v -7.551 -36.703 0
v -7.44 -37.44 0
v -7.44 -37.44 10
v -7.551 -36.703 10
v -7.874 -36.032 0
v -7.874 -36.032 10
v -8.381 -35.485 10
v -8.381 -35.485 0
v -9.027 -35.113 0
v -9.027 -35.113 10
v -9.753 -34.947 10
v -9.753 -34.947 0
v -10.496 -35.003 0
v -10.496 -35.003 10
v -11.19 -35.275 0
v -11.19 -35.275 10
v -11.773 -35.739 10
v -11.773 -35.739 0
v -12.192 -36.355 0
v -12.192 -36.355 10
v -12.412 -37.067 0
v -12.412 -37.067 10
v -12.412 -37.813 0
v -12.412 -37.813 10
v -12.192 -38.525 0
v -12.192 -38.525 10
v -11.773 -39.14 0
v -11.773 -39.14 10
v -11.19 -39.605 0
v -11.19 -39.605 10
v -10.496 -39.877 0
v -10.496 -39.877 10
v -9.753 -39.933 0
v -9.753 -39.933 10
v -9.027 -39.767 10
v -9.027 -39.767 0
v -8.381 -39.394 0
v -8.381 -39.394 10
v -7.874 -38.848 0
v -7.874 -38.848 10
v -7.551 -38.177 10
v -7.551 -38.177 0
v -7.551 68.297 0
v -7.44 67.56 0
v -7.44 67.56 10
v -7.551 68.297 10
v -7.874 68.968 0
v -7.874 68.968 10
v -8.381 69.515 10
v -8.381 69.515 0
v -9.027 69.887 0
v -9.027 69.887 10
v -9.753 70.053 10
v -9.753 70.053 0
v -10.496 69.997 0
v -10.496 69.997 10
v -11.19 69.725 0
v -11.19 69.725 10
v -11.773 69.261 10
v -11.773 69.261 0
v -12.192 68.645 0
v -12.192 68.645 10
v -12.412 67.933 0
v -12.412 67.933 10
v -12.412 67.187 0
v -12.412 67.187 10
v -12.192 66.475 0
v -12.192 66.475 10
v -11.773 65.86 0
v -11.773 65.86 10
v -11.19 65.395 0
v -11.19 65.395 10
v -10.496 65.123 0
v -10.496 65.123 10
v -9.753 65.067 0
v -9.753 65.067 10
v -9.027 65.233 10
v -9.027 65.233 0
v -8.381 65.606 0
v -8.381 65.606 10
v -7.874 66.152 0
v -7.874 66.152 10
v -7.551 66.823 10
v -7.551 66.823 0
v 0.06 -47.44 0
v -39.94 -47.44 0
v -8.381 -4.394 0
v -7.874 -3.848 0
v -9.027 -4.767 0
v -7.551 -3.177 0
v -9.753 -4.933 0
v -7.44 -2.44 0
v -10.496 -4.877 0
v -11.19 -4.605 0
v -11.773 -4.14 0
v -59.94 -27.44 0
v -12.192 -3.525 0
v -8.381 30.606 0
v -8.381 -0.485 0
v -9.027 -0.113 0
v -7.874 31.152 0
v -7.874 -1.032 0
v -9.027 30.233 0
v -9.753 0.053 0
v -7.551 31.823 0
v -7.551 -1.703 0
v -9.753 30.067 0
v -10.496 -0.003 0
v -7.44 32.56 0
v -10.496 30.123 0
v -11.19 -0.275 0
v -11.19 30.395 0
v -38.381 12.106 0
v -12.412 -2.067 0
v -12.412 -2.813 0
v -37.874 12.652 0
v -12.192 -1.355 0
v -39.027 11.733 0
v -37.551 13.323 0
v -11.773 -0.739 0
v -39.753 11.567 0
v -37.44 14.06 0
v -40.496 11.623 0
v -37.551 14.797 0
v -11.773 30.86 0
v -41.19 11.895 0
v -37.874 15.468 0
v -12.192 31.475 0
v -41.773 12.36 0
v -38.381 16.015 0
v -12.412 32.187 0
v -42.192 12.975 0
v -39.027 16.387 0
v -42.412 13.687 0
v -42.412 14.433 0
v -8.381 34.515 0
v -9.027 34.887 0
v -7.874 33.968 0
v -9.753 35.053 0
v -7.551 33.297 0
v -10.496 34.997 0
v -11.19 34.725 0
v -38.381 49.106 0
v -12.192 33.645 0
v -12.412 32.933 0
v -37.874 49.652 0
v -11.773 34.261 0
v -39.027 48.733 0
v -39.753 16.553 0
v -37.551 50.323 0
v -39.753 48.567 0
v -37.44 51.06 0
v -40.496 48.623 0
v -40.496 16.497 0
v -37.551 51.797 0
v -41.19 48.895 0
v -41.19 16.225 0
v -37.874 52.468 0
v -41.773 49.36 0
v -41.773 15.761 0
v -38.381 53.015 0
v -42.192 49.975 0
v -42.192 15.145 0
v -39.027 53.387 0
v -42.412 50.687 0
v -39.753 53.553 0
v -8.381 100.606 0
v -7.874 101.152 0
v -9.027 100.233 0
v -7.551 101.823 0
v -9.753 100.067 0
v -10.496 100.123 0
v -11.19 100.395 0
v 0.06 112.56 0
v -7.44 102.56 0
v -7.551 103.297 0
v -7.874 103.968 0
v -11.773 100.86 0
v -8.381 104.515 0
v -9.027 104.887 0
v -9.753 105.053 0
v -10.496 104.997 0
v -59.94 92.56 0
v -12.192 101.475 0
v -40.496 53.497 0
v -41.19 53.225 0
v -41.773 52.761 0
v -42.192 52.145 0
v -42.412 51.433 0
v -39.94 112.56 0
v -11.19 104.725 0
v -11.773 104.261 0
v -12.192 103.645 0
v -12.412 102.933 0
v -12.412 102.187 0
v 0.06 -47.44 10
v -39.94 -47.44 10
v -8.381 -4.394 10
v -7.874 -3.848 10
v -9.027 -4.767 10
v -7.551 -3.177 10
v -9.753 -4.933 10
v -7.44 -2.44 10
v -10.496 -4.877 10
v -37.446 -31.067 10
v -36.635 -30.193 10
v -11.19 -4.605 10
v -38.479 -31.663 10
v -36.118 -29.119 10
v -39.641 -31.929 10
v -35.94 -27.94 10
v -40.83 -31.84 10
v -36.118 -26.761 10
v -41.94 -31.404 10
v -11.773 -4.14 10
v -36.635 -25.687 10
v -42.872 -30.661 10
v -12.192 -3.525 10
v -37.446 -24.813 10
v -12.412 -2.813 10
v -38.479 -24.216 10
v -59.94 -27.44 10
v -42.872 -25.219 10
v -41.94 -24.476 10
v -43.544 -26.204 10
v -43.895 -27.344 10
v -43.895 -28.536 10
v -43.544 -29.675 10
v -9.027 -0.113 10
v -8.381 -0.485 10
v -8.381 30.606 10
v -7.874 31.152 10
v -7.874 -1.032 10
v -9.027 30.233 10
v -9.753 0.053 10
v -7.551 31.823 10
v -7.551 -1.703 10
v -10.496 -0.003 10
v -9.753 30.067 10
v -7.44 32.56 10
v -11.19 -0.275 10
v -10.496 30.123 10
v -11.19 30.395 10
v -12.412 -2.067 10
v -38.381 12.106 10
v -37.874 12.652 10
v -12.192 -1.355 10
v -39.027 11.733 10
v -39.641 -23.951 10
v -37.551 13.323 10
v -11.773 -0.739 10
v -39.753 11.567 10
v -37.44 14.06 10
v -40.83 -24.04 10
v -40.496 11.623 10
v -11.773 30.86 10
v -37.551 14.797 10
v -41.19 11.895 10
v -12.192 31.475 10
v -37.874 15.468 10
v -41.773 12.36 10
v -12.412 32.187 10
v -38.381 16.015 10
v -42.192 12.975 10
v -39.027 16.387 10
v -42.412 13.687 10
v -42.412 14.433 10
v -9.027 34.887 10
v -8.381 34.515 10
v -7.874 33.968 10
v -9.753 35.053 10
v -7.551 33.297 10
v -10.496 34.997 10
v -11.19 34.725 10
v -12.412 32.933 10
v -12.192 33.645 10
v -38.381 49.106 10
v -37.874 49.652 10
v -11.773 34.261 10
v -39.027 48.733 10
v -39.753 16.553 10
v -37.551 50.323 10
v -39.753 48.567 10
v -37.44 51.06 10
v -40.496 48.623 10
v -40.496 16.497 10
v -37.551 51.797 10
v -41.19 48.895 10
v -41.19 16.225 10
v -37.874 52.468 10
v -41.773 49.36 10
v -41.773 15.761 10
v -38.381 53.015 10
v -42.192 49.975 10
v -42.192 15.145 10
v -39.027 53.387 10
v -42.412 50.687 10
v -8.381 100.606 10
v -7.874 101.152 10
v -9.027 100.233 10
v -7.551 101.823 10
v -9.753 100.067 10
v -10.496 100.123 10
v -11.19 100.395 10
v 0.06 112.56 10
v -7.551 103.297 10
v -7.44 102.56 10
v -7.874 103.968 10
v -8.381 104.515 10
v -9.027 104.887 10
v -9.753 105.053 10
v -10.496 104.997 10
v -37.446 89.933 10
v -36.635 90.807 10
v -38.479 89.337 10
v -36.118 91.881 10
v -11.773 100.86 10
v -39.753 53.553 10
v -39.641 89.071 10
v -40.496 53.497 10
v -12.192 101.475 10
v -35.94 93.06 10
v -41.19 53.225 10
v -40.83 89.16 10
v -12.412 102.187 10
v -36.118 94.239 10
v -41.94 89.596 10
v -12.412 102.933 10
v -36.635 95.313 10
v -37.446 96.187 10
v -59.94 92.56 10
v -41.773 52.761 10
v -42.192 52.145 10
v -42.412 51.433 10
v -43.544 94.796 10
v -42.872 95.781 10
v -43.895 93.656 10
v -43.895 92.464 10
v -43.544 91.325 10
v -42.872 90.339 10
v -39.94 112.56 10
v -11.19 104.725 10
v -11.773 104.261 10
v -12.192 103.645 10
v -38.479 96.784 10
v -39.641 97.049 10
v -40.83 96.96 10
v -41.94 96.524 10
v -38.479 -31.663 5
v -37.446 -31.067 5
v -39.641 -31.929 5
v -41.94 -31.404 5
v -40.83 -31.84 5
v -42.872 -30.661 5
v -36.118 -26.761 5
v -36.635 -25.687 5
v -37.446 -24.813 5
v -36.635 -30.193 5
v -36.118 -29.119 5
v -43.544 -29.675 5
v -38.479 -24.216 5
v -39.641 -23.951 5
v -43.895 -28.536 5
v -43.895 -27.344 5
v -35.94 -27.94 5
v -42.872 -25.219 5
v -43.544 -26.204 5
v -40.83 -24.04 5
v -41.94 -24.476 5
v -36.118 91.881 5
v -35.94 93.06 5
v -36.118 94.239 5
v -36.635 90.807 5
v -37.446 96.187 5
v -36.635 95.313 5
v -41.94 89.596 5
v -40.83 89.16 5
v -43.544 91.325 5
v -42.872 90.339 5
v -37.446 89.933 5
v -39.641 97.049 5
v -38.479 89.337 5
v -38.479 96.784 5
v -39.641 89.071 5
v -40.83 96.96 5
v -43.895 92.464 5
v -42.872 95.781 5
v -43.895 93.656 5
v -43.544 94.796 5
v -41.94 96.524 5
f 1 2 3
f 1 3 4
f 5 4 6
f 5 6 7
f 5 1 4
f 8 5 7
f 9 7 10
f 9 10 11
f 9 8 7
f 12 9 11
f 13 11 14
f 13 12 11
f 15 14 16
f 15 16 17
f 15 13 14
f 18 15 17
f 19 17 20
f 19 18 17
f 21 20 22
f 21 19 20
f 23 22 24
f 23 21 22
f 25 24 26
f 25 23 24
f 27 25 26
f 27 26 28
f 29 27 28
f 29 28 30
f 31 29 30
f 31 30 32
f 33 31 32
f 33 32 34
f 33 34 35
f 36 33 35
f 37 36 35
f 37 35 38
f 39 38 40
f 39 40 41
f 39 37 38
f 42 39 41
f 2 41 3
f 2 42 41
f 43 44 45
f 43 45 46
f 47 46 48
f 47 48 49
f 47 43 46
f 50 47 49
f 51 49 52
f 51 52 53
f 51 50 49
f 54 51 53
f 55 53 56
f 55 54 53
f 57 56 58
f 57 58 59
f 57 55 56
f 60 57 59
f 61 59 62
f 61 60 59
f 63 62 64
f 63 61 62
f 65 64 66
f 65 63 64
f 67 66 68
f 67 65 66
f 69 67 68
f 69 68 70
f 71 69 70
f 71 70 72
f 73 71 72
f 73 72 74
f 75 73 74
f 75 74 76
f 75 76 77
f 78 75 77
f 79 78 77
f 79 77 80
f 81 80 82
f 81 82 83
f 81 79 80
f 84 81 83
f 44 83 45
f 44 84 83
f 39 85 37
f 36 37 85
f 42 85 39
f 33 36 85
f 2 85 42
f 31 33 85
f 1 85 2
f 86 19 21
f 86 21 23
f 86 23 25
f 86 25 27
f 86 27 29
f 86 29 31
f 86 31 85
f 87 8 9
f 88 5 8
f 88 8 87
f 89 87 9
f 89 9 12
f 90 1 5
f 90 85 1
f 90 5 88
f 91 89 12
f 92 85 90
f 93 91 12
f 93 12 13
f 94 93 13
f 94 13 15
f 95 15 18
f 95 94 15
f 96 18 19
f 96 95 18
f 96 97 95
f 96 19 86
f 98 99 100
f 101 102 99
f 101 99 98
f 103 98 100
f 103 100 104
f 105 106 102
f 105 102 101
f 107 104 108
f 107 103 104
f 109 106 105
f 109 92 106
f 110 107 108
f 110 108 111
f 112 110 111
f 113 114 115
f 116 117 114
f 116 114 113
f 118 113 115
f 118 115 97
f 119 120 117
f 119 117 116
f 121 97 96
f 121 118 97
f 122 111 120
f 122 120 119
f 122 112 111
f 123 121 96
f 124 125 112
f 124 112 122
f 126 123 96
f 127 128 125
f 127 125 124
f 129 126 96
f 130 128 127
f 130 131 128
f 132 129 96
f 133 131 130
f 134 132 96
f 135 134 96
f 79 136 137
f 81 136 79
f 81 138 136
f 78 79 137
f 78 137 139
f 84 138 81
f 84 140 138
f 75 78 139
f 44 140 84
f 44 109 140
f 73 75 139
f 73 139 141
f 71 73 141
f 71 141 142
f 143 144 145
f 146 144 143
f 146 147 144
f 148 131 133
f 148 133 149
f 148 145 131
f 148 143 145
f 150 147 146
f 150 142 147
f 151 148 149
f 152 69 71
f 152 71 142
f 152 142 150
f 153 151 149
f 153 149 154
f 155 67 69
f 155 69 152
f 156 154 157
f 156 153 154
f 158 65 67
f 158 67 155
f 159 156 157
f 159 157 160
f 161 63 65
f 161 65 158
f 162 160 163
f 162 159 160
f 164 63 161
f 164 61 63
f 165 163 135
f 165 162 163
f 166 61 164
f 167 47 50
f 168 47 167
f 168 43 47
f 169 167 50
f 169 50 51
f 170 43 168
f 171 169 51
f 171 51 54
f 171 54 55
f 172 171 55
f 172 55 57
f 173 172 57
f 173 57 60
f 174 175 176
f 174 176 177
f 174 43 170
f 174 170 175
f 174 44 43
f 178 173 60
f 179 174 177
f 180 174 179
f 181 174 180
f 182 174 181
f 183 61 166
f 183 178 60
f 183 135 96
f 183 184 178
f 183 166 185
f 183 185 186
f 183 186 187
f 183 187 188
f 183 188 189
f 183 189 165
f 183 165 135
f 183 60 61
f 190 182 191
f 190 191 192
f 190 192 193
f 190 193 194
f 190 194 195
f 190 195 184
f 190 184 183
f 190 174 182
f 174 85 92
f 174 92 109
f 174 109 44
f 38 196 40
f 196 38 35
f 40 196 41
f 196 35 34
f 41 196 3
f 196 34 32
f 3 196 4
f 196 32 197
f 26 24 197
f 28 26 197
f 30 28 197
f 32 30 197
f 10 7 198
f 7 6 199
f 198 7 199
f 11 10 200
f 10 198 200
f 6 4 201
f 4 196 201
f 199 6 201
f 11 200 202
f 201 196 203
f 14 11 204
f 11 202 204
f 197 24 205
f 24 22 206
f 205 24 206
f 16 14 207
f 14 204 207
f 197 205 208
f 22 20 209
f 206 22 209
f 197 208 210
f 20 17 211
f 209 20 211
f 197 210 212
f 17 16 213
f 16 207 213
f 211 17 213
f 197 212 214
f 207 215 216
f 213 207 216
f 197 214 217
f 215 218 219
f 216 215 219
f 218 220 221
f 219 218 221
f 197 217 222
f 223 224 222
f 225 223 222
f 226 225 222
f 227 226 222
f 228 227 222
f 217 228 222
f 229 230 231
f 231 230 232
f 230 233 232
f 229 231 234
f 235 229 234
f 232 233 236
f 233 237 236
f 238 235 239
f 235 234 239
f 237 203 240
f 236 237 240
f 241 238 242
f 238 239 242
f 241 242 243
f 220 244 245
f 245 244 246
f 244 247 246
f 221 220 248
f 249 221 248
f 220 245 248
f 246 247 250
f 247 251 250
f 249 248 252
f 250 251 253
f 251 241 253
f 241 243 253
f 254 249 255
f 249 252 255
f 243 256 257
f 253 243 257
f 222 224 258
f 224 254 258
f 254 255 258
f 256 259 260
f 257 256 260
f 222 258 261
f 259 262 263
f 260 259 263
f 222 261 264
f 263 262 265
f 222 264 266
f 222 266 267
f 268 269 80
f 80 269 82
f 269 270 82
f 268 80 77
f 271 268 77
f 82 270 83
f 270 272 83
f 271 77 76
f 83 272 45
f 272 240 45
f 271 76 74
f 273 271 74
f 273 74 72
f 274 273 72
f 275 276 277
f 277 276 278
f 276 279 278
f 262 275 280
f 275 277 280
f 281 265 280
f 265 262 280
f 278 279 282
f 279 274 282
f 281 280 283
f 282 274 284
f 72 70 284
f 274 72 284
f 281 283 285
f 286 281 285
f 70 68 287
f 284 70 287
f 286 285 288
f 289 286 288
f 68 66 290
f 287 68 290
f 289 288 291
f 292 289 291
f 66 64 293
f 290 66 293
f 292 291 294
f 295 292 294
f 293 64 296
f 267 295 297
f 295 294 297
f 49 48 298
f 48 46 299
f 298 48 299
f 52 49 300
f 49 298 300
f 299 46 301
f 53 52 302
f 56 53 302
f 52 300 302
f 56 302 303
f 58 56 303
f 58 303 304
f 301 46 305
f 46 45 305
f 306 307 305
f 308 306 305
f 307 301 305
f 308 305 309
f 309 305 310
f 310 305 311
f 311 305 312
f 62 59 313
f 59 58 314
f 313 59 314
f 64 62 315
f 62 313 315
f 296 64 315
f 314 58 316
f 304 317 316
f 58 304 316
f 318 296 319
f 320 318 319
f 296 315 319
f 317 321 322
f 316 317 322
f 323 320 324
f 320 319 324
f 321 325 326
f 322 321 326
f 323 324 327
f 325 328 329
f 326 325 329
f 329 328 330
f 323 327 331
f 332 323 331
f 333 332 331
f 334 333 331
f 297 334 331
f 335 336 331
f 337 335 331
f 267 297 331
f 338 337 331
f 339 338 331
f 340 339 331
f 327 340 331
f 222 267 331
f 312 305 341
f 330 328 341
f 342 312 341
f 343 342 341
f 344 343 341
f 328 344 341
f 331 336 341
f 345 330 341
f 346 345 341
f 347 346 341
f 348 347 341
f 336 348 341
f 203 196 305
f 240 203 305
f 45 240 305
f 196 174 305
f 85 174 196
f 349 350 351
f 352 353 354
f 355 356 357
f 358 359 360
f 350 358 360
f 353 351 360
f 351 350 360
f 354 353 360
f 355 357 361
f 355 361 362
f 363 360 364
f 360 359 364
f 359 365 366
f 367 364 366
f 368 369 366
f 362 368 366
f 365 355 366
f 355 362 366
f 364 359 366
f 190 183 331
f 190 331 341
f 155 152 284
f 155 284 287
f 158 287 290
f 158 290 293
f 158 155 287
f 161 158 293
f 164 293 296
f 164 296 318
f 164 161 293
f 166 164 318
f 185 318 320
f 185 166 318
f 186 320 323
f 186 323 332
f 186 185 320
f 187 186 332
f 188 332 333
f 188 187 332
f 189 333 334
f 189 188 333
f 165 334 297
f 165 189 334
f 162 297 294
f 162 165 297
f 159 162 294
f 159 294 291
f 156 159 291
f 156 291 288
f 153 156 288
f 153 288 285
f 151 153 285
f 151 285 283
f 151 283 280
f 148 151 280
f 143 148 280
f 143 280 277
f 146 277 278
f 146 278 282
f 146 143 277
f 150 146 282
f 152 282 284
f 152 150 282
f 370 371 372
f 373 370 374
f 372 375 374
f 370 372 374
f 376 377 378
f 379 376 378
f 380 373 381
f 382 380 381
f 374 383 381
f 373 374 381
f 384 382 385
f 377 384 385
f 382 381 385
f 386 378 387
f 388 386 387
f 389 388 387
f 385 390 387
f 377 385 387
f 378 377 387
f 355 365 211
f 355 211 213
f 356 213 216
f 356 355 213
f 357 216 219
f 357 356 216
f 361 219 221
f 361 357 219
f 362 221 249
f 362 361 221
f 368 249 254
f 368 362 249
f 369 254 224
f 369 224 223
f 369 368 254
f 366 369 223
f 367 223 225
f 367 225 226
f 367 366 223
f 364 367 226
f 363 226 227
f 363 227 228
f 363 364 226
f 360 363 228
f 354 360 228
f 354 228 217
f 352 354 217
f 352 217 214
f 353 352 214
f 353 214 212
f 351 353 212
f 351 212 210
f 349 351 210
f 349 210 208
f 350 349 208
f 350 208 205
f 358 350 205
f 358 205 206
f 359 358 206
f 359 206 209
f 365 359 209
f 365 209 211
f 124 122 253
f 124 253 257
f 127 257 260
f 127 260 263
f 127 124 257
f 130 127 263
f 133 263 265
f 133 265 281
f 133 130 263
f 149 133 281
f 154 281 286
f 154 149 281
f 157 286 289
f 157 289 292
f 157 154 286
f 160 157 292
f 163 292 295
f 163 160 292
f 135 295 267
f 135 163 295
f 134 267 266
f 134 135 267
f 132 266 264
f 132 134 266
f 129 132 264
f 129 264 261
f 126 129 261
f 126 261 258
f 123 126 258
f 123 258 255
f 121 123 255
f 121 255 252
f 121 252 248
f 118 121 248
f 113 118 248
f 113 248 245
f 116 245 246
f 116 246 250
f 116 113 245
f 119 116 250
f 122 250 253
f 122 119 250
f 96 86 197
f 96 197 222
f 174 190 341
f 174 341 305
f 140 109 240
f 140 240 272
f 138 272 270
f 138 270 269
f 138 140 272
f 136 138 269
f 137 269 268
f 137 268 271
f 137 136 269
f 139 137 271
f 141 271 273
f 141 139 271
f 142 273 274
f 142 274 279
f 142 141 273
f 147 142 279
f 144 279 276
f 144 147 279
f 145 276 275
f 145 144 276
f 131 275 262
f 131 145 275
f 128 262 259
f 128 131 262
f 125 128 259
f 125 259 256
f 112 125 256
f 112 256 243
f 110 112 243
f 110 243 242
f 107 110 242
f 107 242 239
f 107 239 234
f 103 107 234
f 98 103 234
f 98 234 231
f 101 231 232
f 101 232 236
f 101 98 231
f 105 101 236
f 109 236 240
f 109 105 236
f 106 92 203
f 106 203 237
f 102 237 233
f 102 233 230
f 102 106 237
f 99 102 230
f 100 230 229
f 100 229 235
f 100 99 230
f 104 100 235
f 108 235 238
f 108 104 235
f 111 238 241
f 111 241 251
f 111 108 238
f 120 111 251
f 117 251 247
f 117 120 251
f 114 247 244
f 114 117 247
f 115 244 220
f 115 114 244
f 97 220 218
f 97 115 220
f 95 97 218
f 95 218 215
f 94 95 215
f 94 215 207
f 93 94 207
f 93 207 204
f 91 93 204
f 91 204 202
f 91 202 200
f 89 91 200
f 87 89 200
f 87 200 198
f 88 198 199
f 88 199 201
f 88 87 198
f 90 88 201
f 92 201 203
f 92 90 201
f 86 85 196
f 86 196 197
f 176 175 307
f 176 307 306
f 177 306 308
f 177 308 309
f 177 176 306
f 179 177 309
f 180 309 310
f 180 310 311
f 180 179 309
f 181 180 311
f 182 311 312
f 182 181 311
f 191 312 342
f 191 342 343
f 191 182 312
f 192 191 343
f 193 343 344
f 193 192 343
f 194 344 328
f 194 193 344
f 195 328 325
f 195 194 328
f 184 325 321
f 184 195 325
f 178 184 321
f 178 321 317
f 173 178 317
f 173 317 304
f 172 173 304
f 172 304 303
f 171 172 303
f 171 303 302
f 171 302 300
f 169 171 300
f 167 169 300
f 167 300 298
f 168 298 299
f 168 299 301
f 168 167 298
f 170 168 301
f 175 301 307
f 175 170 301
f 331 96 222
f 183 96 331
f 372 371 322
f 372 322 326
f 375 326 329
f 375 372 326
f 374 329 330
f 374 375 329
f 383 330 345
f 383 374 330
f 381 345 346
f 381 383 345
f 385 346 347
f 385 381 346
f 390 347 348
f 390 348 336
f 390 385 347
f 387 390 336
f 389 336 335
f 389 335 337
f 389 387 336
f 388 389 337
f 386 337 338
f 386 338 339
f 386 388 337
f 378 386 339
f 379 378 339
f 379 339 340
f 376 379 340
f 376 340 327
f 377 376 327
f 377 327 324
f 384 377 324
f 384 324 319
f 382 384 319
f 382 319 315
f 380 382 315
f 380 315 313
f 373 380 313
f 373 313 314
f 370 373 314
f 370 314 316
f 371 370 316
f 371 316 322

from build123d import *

# Parameters (mm, degrees)
ESBO_O1_R                = 2.500003623
ESBO_O1_R_2              = 2.499998411
ESBO_O1_R_3              = 2.500000084
ESBO_O1_R_4              = 2.500000523
ESBO_O1_R_5              = 2.500001341
ESBO_O1_R_6              = 2.499999924
ESBO_O1_R_7              = 2.500000177
ESBO_O1_R_8              = 4
RESSALTO_EXTRUS_O1_DEPTH = 10
ESBO_O2_R                = 4
RESSALTO_EXTRUS_O2_DEPTH = 5


with BuildPart() as part:
    # Esboço1 → Ressalto-extrusão1 (new body)
    with BuildSketch(Plane.XY):
        Polygon((0.059999999, 112.560092658), (0.059999999, -47.439905629), (-39.939999107, -47.439905629), (-59.93999866, -27.439906076), (-59.93999866, 92.560094967), (-39.94000097, 112.560092658), align=None)
        with Locations((-9.939999778, 102.560092881)):
            Circle(ESBO_O1_R, mode=Mode.SUBTRACT)
        with Locations((-9.939999778, 67.560092732)):
            Circle(ESBO_O1_R_2, mode=Mode.SUBTRACT)
        with Locations((-9.939999778, 32.560099544)):
            Circle(ESBO_O1_R_3, mode=Mode.SUBTRACT)
        with Locations((-39.939999107, 51.060092822)):
            Circle(ESBO_O1_R_4, mode=Mode.SUBTRACT)
        with Locations((-39.939999107, 14.06009607)):
            Circle(ESBO_O1_R_5, mode=Mode.SUBTRACT)
        with Locations((-9.939997915, -2.439905703)):
            Circle(ESBO_O1_R_6, mode=Mode.SUBTRACT)
        with Locations((-9.939997915, -37.439905619)):
            Circle(ESBO_O1_R_7, mode=Mode.SUBTRACT)
        with Locations((-39.939999107, -27.93990393)):
            Circle(ESBO_O1_R_8, mode=Mode.SUBTRACT)
        with Locations((-39.94001777, 93.060093764)):
            Circle(ESBO_O1_R_8, mode=Mode.SUBTRACT)
    extrude(amount=RESSALTO_EXTRUS_O1_DEPTH)

    # Esboço2 → Ressalto-extrusão2 (add)
    with BuildSketch(Plane(origin=(0, 0, 0), x_dir=(-1, 0, 0), z_dir=(0, 0, -1))):
        with Locations((39.94001777, 93.060093764)):
            Circle(ESBO_O2_R)
        with Locations((39.939999107, -27.93990393)):
            Circle(ESBO_O2_R)
    extrude(amount=-RESSALTO_EXTRUS_O2_DEPTH)


solid = part.part
